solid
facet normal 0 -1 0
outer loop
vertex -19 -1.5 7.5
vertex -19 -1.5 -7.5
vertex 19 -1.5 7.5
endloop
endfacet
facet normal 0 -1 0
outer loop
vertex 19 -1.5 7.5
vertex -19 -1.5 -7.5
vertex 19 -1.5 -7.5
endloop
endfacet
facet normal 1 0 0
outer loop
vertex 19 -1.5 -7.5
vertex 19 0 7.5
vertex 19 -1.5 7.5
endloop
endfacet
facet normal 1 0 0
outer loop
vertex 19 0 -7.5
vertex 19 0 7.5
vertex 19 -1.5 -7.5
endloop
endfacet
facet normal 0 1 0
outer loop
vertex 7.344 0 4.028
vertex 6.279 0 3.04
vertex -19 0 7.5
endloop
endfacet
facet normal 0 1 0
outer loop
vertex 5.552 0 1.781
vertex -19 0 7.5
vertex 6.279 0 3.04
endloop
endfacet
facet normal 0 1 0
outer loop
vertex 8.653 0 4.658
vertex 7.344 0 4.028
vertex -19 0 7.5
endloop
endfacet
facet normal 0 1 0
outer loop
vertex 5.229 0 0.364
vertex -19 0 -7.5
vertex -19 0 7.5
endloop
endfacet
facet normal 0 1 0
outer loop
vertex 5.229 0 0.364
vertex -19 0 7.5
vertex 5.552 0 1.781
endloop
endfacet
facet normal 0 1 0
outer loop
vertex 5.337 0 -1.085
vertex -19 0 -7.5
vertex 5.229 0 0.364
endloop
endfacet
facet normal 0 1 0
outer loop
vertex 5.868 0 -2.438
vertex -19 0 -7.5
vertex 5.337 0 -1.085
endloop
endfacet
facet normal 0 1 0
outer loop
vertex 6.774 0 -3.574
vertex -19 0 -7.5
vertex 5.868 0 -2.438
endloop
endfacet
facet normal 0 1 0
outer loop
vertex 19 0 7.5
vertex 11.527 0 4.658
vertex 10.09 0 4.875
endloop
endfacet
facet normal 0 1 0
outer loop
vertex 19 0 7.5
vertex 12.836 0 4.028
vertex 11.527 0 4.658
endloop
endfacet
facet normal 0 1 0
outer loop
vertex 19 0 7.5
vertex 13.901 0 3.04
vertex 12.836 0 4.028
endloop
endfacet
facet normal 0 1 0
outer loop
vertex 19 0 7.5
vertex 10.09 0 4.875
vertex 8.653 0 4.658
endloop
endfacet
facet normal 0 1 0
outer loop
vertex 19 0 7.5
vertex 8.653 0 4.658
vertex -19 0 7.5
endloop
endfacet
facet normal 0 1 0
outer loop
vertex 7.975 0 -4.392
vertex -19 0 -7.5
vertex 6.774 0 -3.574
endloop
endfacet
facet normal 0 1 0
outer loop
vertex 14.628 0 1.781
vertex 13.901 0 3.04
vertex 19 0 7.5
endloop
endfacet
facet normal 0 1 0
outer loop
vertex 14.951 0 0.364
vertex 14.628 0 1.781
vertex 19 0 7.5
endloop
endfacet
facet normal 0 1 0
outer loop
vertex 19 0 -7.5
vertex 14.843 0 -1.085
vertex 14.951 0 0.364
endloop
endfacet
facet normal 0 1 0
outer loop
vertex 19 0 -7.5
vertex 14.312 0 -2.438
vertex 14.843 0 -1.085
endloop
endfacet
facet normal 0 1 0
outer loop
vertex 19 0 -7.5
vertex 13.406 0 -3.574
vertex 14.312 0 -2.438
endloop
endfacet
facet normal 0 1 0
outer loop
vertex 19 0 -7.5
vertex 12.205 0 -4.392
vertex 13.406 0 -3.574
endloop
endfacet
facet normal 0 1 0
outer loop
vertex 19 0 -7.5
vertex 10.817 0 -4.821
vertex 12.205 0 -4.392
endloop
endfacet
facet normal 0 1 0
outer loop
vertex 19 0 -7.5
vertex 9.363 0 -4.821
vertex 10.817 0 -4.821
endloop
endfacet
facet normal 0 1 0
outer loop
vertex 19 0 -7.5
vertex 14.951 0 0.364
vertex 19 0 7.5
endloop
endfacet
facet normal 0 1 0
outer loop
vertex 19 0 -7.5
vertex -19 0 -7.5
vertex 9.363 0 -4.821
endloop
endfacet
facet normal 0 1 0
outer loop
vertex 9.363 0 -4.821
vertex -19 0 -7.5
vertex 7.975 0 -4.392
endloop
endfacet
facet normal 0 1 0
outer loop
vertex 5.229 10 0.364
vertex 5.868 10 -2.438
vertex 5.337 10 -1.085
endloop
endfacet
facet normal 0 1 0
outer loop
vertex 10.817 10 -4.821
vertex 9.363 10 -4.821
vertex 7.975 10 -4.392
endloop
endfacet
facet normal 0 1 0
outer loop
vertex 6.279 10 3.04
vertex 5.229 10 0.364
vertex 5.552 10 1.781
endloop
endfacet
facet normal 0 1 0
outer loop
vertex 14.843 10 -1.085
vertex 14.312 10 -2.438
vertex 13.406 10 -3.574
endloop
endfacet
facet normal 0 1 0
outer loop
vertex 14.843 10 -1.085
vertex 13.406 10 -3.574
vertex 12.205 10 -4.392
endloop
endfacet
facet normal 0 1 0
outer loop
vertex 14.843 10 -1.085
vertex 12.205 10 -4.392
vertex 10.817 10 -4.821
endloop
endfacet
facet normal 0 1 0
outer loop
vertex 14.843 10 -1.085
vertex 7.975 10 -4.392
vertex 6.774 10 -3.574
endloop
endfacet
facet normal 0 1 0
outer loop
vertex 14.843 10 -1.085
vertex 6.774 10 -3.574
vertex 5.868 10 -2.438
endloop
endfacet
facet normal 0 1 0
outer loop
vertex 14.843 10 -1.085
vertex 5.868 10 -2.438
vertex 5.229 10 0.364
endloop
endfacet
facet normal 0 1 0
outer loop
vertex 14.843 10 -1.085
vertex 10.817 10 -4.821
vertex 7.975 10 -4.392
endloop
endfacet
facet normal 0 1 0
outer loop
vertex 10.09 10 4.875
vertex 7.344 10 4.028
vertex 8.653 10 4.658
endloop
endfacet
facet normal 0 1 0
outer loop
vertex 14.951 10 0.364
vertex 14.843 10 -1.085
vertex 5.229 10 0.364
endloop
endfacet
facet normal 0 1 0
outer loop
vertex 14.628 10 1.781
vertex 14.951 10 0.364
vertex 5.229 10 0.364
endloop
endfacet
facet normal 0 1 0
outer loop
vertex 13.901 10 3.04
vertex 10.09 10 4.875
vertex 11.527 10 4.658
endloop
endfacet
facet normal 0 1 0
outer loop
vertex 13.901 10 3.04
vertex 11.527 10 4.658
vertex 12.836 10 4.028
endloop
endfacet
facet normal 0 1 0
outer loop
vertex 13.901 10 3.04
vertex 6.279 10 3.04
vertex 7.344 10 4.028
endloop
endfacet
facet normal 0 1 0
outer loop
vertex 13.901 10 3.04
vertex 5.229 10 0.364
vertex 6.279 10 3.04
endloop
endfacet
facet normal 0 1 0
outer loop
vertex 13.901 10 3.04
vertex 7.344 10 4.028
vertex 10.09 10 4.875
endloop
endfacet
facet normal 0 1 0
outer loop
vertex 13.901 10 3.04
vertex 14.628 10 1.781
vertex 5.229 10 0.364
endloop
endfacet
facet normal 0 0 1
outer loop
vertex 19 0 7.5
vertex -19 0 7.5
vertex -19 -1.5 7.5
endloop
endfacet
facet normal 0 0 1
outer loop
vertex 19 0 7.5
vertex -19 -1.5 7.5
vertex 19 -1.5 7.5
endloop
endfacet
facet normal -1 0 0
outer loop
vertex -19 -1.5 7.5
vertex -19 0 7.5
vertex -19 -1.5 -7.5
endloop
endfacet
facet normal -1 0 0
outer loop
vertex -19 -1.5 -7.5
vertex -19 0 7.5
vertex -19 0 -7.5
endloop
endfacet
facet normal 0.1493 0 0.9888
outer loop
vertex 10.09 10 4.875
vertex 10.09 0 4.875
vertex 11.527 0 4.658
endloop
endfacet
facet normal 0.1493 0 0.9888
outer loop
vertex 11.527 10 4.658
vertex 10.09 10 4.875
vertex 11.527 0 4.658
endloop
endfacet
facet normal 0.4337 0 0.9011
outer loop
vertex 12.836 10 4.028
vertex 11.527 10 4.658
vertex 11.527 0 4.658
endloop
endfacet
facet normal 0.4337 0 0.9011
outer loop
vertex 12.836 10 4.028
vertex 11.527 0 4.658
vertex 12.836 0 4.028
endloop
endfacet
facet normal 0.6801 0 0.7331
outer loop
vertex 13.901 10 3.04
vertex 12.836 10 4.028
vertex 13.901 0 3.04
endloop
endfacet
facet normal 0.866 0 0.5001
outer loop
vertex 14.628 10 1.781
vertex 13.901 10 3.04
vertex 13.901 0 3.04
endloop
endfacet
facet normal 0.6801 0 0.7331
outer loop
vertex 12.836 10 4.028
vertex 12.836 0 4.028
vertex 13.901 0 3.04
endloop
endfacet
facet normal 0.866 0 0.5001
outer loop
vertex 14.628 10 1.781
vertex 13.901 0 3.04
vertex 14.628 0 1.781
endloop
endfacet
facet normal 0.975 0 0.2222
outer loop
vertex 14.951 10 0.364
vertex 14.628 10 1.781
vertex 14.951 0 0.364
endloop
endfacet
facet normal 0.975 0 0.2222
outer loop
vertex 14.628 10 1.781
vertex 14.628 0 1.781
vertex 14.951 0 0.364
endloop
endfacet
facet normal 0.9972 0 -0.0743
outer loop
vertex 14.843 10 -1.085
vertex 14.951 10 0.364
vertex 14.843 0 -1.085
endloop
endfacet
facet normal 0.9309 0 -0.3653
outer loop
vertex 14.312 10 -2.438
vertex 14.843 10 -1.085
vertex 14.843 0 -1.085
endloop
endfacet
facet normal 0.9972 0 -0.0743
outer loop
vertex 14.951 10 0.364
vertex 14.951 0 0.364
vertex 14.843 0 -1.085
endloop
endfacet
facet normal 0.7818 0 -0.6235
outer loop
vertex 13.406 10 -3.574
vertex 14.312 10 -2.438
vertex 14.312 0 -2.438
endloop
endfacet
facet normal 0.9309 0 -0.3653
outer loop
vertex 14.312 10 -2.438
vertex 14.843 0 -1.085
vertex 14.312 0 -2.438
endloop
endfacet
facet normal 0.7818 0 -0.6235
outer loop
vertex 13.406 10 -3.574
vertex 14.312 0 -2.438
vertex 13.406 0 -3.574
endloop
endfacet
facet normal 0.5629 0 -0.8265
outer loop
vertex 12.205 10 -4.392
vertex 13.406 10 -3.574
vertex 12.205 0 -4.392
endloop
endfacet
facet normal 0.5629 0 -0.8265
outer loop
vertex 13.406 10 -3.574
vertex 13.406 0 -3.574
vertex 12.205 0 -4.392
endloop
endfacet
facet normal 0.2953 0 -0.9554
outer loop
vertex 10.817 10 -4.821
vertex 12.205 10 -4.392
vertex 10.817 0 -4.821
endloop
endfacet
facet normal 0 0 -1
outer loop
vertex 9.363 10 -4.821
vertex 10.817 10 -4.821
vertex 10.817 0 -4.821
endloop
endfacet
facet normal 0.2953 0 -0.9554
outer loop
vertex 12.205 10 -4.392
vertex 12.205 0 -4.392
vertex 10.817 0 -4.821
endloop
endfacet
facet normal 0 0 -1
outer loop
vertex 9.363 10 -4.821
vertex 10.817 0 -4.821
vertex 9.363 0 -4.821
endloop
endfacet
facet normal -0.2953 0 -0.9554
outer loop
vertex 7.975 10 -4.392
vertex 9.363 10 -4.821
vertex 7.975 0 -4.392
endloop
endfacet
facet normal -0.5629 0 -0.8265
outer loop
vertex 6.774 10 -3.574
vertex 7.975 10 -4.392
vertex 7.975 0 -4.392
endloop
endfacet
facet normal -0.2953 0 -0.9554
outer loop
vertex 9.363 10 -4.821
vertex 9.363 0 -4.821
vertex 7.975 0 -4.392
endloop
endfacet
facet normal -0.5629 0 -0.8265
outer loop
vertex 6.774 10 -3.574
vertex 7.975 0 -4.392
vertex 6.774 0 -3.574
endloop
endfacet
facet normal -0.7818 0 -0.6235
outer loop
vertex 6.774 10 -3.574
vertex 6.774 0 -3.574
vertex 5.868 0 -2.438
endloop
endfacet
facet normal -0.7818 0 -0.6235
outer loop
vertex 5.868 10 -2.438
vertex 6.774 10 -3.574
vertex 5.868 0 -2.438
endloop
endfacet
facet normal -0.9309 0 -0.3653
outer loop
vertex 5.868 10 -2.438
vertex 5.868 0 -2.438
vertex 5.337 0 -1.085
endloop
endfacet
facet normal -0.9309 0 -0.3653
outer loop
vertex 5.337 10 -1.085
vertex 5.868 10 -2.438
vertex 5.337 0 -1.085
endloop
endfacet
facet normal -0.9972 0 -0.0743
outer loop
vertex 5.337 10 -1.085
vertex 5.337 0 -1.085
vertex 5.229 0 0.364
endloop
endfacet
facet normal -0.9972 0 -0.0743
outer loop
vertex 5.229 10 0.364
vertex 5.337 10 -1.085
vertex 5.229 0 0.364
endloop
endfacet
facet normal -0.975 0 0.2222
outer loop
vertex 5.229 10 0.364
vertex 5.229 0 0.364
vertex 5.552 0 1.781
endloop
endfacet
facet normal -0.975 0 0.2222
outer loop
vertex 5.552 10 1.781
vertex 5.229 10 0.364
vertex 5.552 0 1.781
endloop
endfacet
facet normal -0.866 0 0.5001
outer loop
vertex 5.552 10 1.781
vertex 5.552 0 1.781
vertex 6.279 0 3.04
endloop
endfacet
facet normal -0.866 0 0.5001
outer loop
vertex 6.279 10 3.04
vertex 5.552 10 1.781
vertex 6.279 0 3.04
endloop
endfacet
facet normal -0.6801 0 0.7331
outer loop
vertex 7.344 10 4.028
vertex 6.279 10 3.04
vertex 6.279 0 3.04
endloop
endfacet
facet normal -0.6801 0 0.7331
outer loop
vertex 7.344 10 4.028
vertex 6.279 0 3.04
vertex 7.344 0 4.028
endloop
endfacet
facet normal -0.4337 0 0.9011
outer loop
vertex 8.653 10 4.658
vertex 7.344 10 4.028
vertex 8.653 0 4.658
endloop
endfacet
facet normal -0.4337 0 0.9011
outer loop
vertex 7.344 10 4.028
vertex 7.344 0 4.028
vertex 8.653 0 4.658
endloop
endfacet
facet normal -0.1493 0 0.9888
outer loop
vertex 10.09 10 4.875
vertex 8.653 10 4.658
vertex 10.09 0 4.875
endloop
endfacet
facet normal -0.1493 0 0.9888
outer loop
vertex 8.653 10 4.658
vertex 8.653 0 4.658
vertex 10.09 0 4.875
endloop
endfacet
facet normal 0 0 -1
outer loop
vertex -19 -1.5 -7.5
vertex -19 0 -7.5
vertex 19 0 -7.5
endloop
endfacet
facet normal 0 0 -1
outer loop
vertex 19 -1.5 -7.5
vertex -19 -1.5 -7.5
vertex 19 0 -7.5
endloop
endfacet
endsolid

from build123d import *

# Parameters (mm, degrees)
SKETCH1_W           = 38
SKETCH1_H           = 15
BOSS_EXTRUDE1_DEPTH = 1.5
SKETCH1_3_R         = 4.875
BOSS_EXTRUDE2_DEPTH = 10


with BuildPart() as part:
    # Sketch1 → Boss-Extrude1 (new body)
    with BuildSketch(Plane(origin=(0, 0, 0), x_dir=(1, 0, 0), z_dir=(0, 1, 0))):
        Rectangle(SKETCH1_W, SKETCH1_H)
    extrude(amount=-BOSS_EXTRUDE1_DEPTH)

    # Sketch1<3> → Boss-Extrude2 (add)
    with BuildSketch(Plane(origin=(0, 0, 0), x_dir=(1, 0, 0), z_dir=(0, 1, 0))):
        with Locations((10.09, 0)):
            Circle(SKETCH1_3_R)
    extrude(amount=BOSS_EXTRUDE2_DEPTH)


solid = part.part
